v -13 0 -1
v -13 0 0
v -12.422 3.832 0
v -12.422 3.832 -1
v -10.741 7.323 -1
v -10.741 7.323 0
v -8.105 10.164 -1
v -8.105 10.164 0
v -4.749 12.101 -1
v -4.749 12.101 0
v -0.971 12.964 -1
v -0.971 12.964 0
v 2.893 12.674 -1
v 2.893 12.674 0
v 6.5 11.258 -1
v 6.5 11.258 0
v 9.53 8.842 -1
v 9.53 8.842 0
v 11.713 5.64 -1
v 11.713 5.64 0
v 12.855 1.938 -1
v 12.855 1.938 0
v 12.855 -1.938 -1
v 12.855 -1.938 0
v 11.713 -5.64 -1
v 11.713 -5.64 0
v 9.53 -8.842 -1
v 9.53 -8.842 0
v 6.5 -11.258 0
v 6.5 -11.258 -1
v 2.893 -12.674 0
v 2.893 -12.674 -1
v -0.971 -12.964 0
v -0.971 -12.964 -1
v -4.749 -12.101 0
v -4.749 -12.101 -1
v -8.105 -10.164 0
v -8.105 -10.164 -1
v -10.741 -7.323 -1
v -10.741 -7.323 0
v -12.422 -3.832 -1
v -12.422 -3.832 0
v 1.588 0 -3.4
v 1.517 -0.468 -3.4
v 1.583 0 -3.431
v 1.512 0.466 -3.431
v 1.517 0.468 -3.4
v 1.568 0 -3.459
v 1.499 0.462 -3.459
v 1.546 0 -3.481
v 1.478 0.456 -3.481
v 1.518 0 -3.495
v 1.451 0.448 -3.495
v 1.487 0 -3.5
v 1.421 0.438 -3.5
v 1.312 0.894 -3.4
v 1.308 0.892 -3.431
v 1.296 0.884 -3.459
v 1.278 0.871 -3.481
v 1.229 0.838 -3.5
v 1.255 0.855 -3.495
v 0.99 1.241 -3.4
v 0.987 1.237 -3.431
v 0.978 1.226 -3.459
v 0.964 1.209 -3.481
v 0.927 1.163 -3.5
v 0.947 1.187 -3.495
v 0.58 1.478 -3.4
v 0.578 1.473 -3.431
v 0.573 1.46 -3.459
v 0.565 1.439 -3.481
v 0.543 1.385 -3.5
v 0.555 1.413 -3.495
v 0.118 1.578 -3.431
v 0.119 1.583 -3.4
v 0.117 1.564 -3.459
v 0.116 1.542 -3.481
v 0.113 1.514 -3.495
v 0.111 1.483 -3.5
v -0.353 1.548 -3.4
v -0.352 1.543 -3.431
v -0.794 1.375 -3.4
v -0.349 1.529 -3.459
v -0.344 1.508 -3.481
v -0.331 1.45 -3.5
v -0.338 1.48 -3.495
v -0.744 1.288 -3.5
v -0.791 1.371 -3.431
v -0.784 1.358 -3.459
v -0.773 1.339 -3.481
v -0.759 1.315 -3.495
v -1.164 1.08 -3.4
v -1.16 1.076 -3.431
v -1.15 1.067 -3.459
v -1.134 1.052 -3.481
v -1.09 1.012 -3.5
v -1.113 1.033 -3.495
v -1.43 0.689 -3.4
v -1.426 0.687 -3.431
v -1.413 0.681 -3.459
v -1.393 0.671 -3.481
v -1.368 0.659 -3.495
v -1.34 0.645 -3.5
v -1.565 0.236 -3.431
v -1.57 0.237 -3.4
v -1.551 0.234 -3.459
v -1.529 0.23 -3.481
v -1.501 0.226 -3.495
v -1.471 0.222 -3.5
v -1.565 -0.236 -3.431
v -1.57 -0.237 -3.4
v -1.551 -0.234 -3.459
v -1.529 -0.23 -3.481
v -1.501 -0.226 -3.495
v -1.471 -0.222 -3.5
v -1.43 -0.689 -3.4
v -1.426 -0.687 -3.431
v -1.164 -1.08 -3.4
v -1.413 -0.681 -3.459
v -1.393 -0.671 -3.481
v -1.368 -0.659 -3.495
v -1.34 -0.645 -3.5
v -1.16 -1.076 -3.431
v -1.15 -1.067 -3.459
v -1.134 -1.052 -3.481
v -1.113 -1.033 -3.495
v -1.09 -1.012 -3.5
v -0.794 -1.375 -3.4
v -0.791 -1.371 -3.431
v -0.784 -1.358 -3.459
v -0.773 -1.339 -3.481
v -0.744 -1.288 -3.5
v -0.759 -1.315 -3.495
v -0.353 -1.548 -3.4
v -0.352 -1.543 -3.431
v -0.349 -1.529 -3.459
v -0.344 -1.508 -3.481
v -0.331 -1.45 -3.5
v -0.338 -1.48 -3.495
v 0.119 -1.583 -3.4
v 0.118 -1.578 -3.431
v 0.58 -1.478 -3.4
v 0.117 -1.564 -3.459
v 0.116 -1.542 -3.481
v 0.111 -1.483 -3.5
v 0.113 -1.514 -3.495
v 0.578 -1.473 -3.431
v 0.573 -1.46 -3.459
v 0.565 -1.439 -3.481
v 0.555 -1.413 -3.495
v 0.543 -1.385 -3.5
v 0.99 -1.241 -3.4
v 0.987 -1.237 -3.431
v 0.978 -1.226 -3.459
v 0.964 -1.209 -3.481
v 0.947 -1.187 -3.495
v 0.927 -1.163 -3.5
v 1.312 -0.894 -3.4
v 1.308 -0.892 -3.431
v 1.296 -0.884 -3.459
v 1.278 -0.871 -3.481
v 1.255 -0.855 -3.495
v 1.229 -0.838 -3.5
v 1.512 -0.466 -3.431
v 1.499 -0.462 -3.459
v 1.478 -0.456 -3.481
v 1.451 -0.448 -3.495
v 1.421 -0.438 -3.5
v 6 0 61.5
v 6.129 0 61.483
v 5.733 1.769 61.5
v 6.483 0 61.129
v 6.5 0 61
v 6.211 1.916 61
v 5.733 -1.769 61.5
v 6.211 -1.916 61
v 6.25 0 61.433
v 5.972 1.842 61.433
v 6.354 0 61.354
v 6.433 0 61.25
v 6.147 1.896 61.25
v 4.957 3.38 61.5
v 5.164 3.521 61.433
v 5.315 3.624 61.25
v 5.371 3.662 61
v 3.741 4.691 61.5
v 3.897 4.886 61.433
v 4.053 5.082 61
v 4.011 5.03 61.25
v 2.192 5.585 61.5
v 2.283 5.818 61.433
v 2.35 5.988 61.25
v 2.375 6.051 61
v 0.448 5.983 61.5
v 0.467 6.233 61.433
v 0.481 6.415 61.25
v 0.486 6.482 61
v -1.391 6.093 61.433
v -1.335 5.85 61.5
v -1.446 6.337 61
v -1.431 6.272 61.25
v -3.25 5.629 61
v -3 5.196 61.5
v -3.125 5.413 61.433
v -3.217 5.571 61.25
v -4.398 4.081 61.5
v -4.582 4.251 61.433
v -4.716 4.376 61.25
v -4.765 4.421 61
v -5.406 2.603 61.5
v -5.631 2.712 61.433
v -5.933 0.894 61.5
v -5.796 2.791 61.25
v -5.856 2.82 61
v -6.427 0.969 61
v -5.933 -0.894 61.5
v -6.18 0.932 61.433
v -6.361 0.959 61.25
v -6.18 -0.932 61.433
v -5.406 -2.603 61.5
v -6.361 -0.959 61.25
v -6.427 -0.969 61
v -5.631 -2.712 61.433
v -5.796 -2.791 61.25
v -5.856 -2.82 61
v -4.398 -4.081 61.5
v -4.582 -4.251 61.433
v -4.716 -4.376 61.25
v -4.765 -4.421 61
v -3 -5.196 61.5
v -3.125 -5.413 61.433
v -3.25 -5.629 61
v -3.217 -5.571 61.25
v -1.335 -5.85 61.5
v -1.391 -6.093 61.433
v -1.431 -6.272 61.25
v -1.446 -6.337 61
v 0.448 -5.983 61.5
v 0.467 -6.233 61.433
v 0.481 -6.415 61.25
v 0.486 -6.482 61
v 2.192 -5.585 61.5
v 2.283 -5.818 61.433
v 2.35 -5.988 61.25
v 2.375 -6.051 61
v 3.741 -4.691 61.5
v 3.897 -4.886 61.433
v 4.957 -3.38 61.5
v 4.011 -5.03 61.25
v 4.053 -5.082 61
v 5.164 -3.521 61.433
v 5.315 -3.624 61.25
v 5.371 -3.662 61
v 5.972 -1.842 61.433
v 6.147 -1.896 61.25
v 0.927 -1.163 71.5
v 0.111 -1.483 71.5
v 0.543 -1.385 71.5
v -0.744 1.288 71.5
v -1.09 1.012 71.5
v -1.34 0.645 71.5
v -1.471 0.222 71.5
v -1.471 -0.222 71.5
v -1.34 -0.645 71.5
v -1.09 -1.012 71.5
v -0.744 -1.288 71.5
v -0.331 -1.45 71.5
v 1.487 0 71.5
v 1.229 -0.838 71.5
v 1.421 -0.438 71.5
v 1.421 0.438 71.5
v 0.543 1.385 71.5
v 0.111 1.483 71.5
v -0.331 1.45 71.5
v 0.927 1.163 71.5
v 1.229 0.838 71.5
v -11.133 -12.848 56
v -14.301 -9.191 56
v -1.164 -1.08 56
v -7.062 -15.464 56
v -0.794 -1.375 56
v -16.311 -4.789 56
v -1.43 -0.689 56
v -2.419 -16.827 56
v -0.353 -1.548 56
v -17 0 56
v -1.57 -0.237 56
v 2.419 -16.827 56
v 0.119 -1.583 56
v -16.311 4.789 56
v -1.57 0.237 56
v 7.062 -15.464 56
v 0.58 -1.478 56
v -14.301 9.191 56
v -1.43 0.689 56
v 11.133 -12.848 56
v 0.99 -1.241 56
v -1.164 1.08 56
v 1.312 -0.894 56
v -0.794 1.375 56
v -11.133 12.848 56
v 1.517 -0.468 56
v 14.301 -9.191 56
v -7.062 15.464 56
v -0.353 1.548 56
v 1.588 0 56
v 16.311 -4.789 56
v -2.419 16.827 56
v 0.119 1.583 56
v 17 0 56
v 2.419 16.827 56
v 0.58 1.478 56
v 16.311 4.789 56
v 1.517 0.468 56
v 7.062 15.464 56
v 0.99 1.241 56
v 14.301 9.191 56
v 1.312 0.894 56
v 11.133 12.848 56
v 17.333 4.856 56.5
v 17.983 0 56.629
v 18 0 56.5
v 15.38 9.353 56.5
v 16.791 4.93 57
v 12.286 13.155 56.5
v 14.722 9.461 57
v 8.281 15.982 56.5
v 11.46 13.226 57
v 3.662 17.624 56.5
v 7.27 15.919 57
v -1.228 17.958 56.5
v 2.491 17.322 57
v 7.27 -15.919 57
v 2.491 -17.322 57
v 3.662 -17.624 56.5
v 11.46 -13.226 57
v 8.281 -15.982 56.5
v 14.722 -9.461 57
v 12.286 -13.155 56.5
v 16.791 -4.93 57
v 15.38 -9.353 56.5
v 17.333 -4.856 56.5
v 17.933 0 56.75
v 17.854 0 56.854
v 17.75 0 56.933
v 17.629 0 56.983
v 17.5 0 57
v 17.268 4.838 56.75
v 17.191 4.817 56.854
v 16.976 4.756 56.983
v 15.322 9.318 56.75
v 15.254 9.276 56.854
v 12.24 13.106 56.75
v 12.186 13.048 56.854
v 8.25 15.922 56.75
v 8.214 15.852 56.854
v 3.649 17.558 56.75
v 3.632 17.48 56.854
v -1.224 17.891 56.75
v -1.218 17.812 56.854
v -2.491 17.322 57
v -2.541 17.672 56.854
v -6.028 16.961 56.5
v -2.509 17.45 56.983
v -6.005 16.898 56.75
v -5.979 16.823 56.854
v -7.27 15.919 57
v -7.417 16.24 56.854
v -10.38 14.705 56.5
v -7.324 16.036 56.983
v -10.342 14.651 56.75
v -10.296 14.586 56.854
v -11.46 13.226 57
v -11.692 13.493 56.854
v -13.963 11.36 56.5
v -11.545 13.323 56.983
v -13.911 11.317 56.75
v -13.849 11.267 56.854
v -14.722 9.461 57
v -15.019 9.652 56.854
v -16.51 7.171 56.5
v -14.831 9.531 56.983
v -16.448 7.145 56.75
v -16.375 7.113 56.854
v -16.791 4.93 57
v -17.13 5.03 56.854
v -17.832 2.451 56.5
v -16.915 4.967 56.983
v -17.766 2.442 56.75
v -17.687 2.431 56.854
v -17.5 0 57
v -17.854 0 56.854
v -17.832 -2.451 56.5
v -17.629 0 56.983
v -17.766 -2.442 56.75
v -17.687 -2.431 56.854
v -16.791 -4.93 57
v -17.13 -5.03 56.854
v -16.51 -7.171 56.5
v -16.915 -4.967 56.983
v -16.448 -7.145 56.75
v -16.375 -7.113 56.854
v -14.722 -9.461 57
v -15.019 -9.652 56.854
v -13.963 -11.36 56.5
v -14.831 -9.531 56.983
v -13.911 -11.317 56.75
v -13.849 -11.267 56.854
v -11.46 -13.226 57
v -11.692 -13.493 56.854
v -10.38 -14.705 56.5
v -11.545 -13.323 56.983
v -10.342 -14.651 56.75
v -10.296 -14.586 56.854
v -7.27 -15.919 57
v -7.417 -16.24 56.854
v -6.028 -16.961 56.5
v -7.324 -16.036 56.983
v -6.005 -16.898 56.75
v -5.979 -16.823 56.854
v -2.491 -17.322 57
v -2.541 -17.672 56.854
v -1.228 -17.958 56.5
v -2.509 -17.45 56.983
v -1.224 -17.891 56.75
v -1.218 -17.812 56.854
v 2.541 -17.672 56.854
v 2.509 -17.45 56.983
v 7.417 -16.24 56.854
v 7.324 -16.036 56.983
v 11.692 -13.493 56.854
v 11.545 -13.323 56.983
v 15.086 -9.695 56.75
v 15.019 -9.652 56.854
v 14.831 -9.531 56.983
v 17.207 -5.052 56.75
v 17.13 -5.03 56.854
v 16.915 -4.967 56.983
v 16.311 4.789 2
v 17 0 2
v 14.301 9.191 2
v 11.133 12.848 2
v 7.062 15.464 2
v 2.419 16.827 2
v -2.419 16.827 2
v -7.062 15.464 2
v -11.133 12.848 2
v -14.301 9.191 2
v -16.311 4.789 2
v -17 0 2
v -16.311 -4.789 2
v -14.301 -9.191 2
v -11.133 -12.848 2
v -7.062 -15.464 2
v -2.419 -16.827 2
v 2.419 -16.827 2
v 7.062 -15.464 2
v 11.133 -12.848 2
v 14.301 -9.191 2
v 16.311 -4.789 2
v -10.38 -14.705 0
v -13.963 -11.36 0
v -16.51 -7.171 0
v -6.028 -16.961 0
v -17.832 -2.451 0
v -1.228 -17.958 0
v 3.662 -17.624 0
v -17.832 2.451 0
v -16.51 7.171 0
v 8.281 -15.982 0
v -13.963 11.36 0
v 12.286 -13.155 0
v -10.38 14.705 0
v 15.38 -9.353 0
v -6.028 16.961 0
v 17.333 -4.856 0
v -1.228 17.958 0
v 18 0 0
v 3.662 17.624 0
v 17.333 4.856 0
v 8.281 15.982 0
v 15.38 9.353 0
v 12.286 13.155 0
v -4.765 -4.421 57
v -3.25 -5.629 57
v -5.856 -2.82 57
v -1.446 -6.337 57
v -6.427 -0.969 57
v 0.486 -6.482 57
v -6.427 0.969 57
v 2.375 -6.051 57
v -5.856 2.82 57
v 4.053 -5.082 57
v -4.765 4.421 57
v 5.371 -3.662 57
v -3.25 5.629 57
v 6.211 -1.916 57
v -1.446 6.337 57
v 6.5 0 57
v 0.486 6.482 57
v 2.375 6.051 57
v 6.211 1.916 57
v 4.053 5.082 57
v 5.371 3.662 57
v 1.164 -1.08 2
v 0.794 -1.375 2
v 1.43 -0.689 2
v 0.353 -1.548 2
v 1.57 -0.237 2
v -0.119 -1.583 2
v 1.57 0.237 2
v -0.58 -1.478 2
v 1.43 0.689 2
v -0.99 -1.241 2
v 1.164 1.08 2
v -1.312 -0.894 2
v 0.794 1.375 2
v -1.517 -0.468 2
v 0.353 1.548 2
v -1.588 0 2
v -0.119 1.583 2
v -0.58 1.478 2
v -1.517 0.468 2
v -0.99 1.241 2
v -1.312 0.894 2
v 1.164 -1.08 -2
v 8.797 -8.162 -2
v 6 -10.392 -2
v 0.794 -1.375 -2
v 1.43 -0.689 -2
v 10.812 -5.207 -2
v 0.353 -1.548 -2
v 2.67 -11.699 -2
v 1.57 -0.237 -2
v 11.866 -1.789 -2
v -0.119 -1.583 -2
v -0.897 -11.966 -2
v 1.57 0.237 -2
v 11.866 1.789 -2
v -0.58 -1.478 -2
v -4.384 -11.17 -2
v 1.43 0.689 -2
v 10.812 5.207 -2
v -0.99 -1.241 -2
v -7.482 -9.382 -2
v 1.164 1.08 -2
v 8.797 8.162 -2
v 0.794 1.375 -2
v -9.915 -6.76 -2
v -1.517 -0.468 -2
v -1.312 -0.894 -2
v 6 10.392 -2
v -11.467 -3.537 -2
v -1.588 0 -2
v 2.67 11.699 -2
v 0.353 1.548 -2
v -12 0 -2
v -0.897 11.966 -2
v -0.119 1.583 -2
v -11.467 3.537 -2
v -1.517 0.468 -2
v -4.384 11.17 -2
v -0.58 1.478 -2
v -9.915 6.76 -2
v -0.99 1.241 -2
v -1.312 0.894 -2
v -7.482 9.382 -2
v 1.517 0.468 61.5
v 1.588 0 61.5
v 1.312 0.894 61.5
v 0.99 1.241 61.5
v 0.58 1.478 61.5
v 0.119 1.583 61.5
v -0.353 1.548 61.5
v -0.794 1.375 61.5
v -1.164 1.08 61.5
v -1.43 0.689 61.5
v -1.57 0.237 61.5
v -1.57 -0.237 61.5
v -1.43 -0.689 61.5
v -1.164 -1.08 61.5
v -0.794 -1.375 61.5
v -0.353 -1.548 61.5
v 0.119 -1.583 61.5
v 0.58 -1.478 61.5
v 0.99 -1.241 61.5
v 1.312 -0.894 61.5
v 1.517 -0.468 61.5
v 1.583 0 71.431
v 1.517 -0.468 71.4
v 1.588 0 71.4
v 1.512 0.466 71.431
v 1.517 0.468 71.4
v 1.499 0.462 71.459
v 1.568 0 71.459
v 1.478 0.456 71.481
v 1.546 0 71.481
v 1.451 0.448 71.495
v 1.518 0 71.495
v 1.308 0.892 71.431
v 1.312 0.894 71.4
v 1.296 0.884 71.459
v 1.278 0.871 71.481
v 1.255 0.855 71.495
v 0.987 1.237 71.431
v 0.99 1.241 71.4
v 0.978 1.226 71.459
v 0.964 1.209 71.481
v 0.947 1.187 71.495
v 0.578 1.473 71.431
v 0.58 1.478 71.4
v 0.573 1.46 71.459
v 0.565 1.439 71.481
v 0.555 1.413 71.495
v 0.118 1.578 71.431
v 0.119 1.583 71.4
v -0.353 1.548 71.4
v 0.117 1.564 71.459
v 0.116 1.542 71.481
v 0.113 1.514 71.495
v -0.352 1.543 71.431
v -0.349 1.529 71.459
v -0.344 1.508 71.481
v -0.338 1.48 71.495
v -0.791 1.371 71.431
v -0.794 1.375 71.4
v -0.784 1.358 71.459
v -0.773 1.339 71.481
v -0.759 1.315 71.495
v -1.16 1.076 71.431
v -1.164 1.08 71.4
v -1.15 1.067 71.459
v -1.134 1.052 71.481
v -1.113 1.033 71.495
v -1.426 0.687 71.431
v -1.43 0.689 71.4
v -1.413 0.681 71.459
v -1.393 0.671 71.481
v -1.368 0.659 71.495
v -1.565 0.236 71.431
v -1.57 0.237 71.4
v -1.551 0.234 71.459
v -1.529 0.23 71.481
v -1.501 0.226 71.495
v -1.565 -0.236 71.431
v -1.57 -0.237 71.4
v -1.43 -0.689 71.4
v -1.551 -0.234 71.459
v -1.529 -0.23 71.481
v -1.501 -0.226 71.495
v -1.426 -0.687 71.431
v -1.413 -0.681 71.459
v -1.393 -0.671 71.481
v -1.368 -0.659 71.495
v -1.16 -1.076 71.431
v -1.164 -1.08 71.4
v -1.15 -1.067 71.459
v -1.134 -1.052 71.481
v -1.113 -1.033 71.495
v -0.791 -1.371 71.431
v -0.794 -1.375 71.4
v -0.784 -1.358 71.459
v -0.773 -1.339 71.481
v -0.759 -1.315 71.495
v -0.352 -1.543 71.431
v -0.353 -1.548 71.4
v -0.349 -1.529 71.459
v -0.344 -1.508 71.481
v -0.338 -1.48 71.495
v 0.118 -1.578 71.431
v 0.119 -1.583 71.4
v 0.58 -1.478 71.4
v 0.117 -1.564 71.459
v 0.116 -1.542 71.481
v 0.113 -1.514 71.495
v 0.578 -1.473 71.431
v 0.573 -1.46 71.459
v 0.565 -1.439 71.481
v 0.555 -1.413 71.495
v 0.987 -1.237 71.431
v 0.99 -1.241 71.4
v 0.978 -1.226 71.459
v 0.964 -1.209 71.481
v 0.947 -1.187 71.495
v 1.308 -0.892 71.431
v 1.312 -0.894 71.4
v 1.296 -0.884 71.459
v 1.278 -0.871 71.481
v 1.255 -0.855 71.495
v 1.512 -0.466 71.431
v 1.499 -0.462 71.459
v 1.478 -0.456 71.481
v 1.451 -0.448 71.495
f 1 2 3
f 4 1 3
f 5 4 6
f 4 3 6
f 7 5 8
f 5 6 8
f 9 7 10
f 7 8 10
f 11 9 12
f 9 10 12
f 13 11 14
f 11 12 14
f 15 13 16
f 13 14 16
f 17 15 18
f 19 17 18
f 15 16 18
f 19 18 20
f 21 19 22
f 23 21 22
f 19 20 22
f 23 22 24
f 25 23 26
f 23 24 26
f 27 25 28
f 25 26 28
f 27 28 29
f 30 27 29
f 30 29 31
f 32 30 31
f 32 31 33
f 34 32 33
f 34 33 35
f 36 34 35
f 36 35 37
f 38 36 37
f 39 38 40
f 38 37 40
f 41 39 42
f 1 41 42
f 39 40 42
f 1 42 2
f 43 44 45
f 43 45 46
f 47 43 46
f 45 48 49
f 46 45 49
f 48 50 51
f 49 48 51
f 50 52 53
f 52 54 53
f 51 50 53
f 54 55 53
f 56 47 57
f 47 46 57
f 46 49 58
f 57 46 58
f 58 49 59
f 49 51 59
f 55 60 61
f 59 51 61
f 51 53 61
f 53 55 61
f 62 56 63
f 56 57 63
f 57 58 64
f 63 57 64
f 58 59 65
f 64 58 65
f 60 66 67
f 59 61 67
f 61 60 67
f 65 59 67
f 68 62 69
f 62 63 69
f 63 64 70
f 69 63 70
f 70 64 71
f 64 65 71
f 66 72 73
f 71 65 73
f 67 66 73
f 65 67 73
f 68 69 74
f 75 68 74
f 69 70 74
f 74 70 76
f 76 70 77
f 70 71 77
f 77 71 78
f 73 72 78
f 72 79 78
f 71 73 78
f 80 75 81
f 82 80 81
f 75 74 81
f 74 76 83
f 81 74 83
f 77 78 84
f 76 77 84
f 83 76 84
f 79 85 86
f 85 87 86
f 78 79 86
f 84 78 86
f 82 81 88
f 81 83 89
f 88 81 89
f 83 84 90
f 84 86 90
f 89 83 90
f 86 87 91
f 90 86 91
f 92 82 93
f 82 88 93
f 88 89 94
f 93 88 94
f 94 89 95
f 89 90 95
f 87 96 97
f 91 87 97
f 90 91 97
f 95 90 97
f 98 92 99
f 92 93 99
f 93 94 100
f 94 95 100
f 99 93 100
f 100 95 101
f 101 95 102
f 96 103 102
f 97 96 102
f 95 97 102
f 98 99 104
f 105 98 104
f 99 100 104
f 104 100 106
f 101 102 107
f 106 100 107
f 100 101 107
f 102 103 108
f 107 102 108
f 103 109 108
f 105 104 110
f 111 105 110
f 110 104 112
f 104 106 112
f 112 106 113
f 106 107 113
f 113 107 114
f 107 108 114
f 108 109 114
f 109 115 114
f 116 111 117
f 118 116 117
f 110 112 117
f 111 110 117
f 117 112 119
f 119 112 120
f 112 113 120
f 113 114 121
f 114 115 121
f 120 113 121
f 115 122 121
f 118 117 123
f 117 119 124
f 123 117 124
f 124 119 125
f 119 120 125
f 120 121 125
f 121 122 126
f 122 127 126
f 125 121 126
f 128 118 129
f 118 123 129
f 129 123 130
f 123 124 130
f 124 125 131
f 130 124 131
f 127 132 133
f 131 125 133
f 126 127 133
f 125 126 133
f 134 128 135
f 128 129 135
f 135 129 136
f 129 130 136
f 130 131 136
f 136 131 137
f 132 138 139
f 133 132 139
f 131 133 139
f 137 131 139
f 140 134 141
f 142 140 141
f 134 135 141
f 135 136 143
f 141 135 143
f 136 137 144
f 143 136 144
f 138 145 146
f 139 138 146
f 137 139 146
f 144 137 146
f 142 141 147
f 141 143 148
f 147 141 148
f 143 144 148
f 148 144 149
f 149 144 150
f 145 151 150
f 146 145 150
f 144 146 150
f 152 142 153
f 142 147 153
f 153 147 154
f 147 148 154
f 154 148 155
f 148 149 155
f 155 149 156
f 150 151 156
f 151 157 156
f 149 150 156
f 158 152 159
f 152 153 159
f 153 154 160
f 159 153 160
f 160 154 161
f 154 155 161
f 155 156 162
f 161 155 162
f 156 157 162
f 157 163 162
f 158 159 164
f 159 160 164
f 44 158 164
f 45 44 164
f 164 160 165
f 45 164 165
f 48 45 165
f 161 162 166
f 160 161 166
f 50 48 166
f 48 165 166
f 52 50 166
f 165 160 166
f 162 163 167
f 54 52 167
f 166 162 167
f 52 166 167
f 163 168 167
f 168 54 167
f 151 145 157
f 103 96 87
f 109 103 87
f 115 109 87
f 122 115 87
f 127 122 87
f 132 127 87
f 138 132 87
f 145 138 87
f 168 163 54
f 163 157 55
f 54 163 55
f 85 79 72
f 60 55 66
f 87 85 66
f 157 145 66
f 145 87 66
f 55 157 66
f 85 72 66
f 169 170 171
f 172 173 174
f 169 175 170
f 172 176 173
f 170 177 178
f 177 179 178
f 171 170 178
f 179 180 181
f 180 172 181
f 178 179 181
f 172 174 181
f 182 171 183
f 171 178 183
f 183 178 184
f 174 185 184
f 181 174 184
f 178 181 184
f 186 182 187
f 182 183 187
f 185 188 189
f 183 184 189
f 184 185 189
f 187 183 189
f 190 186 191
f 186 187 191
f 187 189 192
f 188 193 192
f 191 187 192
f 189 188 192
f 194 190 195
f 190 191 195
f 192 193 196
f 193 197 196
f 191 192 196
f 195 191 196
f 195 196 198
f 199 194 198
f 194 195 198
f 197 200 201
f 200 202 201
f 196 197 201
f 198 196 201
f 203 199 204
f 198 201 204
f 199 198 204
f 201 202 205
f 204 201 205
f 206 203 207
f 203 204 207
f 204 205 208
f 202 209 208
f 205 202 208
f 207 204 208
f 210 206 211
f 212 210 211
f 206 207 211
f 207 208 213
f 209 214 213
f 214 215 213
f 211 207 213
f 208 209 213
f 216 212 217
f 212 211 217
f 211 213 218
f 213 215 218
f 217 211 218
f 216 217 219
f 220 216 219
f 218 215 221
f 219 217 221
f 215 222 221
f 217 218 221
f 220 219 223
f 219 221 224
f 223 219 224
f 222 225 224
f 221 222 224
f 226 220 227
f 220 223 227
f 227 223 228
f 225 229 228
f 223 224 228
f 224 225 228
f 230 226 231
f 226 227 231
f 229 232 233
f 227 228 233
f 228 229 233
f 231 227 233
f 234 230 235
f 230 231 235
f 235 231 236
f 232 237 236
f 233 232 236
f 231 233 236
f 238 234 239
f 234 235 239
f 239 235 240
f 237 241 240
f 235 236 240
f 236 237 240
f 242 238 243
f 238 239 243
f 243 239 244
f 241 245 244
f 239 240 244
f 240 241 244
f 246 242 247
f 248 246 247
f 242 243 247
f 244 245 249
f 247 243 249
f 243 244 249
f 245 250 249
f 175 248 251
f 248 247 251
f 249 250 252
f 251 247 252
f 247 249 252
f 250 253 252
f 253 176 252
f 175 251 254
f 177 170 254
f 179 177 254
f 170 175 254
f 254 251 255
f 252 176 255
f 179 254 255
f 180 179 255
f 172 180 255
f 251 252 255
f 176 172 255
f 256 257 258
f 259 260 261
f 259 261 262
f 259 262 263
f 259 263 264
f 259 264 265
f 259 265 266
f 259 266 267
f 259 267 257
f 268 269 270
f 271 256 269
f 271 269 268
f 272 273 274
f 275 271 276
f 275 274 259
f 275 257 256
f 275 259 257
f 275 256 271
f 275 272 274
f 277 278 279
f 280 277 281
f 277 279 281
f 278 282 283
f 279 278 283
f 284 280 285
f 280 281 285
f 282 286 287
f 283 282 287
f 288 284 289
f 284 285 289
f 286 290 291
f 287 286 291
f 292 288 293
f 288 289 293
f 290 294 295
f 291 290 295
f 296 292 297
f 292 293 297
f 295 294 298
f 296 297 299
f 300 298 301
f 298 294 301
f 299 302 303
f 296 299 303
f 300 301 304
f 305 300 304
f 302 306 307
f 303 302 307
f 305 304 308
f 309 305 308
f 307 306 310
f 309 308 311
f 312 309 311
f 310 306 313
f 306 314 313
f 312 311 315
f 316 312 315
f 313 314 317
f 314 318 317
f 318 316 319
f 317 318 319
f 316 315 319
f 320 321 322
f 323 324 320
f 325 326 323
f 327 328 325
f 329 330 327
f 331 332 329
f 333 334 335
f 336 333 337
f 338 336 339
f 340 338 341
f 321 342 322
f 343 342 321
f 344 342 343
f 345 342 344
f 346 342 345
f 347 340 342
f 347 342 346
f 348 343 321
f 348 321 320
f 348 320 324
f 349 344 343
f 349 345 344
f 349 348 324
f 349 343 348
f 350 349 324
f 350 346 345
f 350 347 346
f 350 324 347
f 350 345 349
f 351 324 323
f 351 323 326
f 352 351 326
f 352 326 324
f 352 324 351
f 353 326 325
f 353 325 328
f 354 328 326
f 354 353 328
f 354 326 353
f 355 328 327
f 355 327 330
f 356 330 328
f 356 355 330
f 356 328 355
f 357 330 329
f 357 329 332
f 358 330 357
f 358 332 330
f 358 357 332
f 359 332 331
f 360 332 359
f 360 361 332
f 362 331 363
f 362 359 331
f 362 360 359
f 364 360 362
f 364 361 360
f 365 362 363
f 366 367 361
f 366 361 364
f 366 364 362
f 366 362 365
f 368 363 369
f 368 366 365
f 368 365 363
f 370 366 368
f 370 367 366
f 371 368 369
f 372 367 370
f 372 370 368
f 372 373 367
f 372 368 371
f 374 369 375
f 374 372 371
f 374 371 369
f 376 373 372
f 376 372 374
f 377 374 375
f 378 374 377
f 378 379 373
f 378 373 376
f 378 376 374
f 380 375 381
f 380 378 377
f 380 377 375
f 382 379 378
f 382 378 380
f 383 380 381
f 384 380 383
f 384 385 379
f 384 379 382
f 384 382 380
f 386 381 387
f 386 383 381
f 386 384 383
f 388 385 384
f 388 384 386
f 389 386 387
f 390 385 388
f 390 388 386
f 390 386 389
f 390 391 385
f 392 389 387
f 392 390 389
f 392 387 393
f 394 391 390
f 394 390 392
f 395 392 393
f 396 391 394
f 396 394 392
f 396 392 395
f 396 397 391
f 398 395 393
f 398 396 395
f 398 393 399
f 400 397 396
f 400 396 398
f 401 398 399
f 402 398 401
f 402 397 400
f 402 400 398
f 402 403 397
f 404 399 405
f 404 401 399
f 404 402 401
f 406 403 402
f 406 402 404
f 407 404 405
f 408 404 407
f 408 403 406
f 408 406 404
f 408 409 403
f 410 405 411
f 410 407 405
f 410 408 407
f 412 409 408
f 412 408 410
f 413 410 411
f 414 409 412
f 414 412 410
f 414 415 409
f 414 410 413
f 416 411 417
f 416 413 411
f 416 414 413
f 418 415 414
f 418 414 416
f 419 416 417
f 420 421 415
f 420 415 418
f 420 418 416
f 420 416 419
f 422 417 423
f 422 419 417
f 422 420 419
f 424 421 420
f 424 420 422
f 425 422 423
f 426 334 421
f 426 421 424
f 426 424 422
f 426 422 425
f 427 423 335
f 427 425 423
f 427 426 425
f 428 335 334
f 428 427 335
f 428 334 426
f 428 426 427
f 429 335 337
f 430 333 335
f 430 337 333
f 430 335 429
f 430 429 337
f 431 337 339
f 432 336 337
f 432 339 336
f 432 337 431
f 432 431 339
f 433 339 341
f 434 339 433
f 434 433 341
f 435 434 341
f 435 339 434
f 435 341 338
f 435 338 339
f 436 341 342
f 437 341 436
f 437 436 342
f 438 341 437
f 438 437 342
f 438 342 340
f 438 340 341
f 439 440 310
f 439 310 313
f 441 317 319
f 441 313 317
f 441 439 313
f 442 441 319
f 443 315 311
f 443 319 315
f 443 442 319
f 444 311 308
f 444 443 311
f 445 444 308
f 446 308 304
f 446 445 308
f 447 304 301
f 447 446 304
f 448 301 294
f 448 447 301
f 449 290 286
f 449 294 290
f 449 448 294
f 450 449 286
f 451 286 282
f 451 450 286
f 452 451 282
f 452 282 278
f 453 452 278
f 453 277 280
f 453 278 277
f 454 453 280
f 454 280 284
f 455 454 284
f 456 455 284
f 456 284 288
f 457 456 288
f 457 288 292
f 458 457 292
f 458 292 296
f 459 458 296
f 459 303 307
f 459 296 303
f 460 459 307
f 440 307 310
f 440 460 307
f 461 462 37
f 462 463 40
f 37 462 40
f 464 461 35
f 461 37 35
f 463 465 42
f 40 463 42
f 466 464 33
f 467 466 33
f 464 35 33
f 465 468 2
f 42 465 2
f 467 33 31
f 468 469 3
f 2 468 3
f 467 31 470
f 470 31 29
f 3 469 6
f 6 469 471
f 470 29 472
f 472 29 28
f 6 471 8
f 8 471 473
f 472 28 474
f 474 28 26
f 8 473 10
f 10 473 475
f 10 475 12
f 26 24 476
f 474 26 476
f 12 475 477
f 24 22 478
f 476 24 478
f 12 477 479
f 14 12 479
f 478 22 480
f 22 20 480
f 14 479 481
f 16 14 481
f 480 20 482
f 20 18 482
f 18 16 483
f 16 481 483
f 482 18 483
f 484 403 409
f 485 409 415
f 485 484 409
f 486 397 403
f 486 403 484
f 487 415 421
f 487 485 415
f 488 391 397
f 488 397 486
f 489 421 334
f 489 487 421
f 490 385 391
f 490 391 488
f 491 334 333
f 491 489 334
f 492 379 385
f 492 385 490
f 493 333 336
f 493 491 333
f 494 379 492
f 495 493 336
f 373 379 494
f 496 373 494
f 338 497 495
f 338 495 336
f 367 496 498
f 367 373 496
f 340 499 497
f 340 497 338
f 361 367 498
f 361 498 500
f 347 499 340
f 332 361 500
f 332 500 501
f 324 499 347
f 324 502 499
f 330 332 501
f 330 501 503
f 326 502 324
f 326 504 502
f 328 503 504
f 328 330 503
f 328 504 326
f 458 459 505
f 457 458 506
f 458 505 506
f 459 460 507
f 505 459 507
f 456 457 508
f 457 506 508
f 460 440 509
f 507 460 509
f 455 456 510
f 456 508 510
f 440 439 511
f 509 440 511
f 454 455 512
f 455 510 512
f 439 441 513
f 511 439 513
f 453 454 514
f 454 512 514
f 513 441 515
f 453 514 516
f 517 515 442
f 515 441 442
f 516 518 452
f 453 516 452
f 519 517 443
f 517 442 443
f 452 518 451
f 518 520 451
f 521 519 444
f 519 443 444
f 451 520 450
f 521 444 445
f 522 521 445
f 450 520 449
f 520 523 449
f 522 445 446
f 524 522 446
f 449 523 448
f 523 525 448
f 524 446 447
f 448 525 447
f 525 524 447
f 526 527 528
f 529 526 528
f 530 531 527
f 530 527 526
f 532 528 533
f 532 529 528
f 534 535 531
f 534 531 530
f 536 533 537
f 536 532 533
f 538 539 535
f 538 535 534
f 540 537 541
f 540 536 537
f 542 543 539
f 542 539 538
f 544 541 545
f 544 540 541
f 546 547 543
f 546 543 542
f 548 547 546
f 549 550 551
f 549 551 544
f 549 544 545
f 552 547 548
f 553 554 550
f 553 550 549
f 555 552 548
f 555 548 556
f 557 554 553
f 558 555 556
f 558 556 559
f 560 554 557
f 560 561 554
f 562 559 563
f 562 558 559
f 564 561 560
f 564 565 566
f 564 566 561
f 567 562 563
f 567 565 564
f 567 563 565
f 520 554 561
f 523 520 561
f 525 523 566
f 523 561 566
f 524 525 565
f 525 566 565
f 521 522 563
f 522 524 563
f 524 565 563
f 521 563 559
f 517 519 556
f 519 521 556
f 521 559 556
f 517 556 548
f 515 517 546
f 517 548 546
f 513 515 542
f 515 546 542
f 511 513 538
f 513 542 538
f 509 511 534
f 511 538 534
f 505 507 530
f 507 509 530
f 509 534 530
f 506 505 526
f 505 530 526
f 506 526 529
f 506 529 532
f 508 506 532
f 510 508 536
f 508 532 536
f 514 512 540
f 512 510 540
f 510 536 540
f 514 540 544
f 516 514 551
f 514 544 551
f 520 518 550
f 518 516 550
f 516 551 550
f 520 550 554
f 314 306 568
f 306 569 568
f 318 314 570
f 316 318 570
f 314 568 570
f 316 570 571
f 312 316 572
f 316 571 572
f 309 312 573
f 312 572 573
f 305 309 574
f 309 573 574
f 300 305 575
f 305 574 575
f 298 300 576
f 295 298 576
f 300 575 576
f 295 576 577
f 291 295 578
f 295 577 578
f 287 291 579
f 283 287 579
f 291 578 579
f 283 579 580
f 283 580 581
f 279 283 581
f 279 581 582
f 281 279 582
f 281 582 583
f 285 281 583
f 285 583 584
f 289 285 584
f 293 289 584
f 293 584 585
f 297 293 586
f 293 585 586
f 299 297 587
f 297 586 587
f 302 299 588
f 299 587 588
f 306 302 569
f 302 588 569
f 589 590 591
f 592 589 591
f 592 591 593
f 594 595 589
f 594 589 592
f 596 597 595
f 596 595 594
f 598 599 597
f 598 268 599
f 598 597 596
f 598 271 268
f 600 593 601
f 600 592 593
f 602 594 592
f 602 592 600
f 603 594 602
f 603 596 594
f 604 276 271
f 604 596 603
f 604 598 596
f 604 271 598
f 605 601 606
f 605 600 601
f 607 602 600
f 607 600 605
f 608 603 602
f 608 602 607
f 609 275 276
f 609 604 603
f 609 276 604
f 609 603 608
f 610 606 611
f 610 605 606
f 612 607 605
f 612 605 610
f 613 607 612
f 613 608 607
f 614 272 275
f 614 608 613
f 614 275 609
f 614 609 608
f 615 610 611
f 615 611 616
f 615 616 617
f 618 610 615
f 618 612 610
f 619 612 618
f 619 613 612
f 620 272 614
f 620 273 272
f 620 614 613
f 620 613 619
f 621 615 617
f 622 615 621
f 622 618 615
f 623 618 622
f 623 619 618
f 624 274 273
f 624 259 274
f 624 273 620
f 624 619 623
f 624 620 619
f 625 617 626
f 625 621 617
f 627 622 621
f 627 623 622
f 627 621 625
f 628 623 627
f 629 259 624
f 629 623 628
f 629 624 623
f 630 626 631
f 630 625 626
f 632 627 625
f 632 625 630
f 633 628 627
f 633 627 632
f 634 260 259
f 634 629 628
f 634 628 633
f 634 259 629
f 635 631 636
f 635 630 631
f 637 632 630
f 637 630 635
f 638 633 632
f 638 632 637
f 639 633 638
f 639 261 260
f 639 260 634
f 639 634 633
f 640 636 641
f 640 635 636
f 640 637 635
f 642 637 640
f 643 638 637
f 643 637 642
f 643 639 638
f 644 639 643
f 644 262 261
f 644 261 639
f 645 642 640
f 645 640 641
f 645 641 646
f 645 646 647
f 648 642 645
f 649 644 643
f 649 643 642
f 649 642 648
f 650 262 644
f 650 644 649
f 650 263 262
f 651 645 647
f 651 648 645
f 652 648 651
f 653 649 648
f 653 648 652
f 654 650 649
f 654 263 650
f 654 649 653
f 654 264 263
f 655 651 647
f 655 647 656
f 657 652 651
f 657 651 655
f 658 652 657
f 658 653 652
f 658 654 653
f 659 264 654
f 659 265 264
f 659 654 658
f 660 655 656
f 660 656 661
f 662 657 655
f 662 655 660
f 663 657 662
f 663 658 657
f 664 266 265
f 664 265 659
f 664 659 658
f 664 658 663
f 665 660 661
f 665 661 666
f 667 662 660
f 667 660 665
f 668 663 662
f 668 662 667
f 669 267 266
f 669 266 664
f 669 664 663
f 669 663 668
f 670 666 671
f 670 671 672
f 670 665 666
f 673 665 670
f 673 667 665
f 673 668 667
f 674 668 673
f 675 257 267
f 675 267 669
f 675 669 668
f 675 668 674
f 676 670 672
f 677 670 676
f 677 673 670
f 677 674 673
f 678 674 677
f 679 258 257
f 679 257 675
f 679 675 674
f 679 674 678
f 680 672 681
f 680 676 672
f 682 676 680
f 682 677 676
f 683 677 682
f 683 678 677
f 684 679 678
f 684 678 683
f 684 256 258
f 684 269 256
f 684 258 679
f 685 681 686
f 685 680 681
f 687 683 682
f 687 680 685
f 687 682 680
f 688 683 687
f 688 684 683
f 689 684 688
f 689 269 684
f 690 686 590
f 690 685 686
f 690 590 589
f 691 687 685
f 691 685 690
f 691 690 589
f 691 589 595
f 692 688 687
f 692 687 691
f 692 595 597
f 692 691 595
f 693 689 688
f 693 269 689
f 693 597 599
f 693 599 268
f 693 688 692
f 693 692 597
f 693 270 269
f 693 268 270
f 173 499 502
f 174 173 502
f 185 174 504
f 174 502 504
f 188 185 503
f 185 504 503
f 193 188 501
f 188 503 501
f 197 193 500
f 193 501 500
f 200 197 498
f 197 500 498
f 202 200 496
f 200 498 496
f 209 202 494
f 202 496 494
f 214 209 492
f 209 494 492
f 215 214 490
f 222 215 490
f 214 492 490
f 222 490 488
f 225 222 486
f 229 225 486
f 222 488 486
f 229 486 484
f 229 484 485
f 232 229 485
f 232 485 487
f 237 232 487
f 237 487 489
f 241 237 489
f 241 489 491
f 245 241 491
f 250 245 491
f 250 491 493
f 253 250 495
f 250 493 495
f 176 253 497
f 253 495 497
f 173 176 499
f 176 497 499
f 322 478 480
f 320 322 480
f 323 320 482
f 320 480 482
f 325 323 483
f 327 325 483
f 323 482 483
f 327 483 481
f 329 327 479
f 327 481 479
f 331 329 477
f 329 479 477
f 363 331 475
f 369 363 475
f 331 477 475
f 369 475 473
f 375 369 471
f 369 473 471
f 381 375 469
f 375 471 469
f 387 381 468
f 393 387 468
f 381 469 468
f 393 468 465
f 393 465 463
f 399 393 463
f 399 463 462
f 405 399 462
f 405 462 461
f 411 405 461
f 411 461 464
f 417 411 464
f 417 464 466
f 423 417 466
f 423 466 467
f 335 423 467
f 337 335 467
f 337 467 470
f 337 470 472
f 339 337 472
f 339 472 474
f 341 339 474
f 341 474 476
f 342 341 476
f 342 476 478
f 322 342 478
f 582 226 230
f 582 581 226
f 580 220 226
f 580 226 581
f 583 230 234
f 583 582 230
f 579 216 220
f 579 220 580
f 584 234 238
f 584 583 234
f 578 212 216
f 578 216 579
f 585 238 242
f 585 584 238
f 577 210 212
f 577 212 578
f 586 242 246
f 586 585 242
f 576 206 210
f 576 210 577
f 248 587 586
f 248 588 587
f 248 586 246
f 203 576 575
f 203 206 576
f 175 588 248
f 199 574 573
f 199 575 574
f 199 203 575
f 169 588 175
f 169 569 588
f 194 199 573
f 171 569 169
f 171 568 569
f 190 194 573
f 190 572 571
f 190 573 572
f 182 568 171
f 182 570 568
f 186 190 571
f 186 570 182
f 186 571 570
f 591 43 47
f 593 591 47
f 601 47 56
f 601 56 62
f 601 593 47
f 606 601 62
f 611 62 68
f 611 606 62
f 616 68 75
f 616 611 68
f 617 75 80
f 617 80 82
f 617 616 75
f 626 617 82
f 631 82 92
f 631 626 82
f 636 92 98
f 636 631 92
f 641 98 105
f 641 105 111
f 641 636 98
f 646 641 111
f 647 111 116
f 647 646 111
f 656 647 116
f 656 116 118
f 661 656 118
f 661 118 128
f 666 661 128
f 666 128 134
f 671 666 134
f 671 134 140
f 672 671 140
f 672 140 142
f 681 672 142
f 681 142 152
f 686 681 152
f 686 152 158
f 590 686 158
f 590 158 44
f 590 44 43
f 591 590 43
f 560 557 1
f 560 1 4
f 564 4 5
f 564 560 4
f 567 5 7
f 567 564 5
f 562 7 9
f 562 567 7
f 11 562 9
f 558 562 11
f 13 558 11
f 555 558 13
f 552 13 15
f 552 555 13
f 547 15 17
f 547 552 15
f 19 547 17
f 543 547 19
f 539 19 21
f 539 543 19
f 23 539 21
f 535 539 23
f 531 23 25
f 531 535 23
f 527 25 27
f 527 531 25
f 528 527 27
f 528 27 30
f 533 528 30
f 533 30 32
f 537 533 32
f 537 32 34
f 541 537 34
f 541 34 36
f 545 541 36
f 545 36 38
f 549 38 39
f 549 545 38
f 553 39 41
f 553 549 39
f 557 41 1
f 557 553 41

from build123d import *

# Parameters (mm, degrees)
SKETCH1_R                = 18
SKETCH1_R_2              = 17
BOSS_EXTRUDE1_DEPTH      = 57
SKETCH4_R                = 18
BOSS_EXTRUDE4_DEPTH      = 2
SKETCH5_R                = 13
BOSS_EXTRUDE5_DEPTH      = 2
SKETCH6_R                = 1.5875
CUT_EXTRUDE1_DEPTH       = 4
SKETCH7_R                = 18
BOSS_EXTRUDE6_DEPTH      = 1
SKETCH8_R                = 6.5
BOSS_EXTRUDE7_DEPTH      = 4.5
SKETCH9_R                = 1.5875
CUT_EXTRUDE4_DEPTH       = 64.5
SKETCH10_R               = 1.5875
BOSS_EXTRUDE8_DEPTH      = 10
BOSS_EXTRUDE8_DEPTH_BACK = 65
FILLET1_R                = 0.5
FILLET2_R                = 0.1
CHAMFER1_SIZE            = 1
FILLET3_R                = 0.1


with BuildPart() as part:
    # Sketch1 → Boss-Extrude1 (new body)
    with BuildSketch(Plane.XY):
        Circle(SKETCH1_R)
        Circle(SKETCH1_R_2, mode=Mode.SUBTRACT)
    extrude(amount=BOSS_EXTRUDE1_DEPTH)

    # Sketch4 → Boss-Extrude4 (add)
    with BuildSketch(Plane(origin=(0, 0, 0), x_dir=(-1, 0, 0), z_dir=(0, 0, -1))):
        Circle(SKETCH4_R)
    extrude(amount=-BOSS_EXTRUDE4_DEPTH)

    # Sketch5 → Boss-Extrude5 (add)
    with BuildSketch(Plane(origin=(0, 0, 0), x_dir=(-1, 0, 0), z_dir=(0, 0, -1))):
        Circle(SKETCH5_R)
    extrude(amount=BOSS_EXTRUDE5_DEPTH)

    # Sketch6 → Cut-Extrude1 (cut)
    with BuildSketch(Plane(origin=(0, 0, -2), x_dir=(-1, 0, 0), z_dir=(0, 0, -1))):
        Circle(SKETCH6_R)
    extrude(amount=-CUT_EXTRUDE1_DEPTH, mode=Mode.SUBTRACT)

    # Sketch7 → Boss-Extrude6 (add)
    with BuildSketch(Plane.XY.offset(57)):
        Circle(SKETCH7_R)
    extrude(amount=-BOSS_EXTRUDE6_DEPTH)

    # Sketch8 → Boss-Extrude7 (add)
    with BuildSketch(Plane.XY.offset(57)):
        Circle(SKETCH8_R)
    extrude(amount=BOSS_EXTRUDE7_DEPTH)

    # Sketch9 → Cut-Extrude4 (cut, through all)
    with BuildSketch(Plane.XY.offset(61.5)):
        Circle(SKETCH9_R)
    extrude(amount=-CUT_EXTRUDE4_DEPTH, mode=Mode.SUBTRACT)

    # Fillet1
    fillet1_edges = [part.edges().sort_by_distance(p)[0] for p in [
        (-6.5, 0, 61.5),
        (-18, 0, 57),
    ]]
    fillet(fillet1_edges, radius=FILLET1_R)

    # Chamfer1
    chamfer1_edges = [part.edges().sort_by_distance(p)[0] for p in [
        (13, 0, -2),
    ]]
    chamfer(chamfer1_edges, length=CHAMFER1_SIZE)


with BuildPart() as body_2:
    # Sketch10 → Boss-Extrude8 (new body, two sides)
    with BuildSketch(Plane.XY.offset(61.5)) as boss_extrude8_sk:
        Circle(SKETCH10_R)
    extrude(amount=BOSS_EXTRUDE8_DEPTH)
    extrude(boss_extrude8_sk.sketch, amount=-BOSS_EXTRUDE8_DEPTH_BACK)

    # Fillet2
    fillet2_edges = [body_2.edges().sort_by_distance(p)[0] for p in [
        (-1.5875, 0, 71.5),
    ]]
    fillet(fillet2_edges, radius=FILLET2_R)

    # Fillet3
    fillet3_edges = [body_2.edges().sort_by_distance(p)[0] for p in [
        (-1.5875, 0, -3.5),
    ]]
    fillet(fillet3_edges, radius=FILLET3_R)


solid = Compound([part.part, body_2.part])
